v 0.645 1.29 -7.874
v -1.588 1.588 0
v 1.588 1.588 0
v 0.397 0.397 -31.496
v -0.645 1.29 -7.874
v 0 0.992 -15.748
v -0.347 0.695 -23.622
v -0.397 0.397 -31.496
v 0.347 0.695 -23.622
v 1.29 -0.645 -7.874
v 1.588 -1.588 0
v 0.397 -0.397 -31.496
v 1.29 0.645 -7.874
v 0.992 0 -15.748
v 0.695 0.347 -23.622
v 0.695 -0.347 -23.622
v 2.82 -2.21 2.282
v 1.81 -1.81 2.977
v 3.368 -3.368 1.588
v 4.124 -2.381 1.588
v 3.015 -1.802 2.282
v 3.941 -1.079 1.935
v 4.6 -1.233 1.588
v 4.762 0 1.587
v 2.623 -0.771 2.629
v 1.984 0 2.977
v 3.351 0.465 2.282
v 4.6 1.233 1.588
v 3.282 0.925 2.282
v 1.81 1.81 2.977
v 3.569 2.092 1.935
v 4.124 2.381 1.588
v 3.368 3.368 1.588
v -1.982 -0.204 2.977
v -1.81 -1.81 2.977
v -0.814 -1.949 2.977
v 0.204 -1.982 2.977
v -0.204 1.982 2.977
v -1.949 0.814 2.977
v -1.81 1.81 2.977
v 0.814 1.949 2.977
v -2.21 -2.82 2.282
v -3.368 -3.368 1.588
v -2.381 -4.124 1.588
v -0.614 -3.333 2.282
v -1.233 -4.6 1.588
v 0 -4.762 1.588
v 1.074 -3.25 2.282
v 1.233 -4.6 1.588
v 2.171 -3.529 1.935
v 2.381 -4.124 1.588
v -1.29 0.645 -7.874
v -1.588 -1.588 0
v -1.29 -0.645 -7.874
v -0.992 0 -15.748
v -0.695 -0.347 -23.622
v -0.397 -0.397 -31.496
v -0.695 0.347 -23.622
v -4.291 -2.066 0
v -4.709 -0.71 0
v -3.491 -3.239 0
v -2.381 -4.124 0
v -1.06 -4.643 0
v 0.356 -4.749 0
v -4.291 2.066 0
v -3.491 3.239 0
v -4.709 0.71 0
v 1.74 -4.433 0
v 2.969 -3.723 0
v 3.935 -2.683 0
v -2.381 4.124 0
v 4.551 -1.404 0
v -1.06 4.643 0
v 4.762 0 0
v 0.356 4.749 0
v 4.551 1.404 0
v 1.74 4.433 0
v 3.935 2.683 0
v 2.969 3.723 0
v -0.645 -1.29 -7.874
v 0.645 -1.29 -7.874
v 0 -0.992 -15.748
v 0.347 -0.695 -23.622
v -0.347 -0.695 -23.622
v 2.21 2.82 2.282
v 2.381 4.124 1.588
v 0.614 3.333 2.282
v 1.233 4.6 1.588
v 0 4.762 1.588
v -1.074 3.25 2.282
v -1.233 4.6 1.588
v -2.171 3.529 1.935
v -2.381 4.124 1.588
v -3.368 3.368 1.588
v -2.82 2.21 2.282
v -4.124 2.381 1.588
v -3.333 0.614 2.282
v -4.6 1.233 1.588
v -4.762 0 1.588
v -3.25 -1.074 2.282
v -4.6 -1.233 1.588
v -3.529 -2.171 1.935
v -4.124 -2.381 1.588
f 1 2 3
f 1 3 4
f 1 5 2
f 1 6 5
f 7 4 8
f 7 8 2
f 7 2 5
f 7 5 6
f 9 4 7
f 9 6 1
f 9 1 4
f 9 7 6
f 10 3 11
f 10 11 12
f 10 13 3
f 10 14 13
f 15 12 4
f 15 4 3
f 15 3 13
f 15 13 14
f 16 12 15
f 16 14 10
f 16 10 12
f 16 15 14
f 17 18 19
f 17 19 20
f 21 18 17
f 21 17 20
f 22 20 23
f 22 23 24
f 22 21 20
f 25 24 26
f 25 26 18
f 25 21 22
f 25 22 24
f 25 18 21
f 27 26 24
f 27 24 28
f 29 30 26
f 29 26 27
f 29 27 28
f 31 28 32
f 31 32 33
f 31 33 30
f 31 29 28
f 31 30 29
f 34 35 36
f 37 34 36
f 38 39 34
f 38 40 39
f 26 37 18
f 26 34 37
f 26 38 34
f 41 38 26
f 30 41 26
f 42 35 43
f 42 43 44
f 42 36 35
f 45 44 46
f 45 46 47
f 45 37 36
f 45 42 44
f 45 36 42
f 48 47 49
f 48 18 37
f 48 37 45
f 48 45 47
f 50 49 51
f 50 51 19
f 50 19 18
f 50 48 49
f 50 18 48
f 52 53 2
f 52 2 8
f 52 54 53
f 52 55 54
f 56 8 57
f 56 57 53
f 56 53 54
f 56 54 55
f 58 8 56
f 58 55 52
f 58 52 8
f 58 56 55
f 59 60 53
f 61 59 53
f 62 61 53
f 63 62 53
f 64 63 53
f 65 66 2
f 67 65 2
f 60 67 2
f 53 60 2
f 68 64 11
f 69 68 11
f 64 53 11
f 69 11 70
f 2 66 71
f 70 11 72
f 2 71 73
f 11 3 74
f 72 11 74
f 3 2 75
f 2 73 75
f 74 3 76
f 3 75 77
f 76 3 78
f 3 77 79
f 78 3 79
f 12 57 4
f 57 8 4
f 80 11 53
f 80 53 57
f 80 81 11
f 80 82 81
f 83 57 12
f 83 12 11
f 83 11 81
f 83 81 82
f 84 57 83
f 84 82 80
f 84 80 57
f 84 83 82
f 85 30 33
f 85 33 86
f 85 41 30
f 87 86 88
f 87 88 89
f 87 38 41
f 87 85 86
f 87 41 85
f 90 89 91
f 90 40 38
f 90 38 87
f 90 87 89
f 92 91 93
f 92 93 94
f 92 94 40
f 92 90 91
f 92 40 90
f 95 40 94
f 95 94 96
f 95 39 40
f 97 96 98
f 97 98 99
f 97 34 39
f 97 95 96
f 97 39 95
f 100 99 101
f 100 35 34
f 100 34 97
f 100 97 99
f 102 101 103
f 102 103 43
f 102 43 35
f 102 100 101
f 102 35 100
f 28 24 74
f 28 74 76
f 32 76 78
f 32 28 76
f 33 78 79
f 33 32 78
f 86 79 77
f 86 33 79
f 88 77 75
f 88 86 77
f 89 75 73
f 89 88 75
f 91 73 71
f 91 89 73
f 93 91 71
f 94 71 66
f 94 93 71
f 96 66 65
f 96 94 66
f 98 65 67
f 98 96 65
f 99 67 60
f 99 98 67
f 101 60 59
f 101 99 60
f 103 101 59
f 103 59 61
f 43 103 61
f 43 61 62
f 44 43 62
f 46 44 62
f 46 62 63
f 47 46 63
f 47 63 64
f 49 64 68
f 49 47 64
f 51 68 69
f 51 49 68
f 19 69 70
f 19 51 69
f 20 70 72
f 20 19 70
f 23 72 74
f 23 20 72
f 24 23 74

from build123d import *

# Parameters (mm, degrees)
F0_R      = 4.7625
F2_R      = 4.7625
F5_FACE_R = 4.7625
F4_W      = 3.175
F4_H      = 3.175
F9_W      = 3.175
F9_H      = 3.175
F8_W      = 0.79375
F8_H      = 0.79375
F11_R     = 2.6419390303
F12_DEPTH = 0.1984375


with BuildPart() as f5:
    # F0 (on Top) → F5 section 0
    with BuildSketch(Plane.XY):
        Circle(F0_R)
    # F2 (on offset) → F5 section 1
    with BuildSketch(Plane.XY.offset(1.5875)):
        Circle(F2_R)
    loft()

    # F5_face (on face) → F6 section 0
    with BuildSketch(Plane.XY.offset(1.5875)):
        Circle(F5_FACE_R)
    # F4 (on offset) → F6 section 1
    with BuildSketch(Plane.XY.offset(3.175)):
        Rectangle(F4_W, F4_H)
    loft()

    # F9 (on face) → F10 section 0
    with BuildSketch(Plane(origin=(0, 0, 0), x_dir=(1, 0, 0), z_dir=(0, 0, -1))):
        Rectangle(F9_W, F9_H)
    # F8 (on offset) → F10 section 1
    with BuildSketch(Plane.XY.offset(-31.496)):
        Rectangle(F8_W, F8_H)
    loft()

    # F11 (on offset) → F12 (cut)
    with BuildSketch(Plane.XY.offset(3.175)):
        Circle(F11_R)
    extrude(amount=-F12_DEPTH, mode=Mode.SUBTRACT)


solid = f5.part
